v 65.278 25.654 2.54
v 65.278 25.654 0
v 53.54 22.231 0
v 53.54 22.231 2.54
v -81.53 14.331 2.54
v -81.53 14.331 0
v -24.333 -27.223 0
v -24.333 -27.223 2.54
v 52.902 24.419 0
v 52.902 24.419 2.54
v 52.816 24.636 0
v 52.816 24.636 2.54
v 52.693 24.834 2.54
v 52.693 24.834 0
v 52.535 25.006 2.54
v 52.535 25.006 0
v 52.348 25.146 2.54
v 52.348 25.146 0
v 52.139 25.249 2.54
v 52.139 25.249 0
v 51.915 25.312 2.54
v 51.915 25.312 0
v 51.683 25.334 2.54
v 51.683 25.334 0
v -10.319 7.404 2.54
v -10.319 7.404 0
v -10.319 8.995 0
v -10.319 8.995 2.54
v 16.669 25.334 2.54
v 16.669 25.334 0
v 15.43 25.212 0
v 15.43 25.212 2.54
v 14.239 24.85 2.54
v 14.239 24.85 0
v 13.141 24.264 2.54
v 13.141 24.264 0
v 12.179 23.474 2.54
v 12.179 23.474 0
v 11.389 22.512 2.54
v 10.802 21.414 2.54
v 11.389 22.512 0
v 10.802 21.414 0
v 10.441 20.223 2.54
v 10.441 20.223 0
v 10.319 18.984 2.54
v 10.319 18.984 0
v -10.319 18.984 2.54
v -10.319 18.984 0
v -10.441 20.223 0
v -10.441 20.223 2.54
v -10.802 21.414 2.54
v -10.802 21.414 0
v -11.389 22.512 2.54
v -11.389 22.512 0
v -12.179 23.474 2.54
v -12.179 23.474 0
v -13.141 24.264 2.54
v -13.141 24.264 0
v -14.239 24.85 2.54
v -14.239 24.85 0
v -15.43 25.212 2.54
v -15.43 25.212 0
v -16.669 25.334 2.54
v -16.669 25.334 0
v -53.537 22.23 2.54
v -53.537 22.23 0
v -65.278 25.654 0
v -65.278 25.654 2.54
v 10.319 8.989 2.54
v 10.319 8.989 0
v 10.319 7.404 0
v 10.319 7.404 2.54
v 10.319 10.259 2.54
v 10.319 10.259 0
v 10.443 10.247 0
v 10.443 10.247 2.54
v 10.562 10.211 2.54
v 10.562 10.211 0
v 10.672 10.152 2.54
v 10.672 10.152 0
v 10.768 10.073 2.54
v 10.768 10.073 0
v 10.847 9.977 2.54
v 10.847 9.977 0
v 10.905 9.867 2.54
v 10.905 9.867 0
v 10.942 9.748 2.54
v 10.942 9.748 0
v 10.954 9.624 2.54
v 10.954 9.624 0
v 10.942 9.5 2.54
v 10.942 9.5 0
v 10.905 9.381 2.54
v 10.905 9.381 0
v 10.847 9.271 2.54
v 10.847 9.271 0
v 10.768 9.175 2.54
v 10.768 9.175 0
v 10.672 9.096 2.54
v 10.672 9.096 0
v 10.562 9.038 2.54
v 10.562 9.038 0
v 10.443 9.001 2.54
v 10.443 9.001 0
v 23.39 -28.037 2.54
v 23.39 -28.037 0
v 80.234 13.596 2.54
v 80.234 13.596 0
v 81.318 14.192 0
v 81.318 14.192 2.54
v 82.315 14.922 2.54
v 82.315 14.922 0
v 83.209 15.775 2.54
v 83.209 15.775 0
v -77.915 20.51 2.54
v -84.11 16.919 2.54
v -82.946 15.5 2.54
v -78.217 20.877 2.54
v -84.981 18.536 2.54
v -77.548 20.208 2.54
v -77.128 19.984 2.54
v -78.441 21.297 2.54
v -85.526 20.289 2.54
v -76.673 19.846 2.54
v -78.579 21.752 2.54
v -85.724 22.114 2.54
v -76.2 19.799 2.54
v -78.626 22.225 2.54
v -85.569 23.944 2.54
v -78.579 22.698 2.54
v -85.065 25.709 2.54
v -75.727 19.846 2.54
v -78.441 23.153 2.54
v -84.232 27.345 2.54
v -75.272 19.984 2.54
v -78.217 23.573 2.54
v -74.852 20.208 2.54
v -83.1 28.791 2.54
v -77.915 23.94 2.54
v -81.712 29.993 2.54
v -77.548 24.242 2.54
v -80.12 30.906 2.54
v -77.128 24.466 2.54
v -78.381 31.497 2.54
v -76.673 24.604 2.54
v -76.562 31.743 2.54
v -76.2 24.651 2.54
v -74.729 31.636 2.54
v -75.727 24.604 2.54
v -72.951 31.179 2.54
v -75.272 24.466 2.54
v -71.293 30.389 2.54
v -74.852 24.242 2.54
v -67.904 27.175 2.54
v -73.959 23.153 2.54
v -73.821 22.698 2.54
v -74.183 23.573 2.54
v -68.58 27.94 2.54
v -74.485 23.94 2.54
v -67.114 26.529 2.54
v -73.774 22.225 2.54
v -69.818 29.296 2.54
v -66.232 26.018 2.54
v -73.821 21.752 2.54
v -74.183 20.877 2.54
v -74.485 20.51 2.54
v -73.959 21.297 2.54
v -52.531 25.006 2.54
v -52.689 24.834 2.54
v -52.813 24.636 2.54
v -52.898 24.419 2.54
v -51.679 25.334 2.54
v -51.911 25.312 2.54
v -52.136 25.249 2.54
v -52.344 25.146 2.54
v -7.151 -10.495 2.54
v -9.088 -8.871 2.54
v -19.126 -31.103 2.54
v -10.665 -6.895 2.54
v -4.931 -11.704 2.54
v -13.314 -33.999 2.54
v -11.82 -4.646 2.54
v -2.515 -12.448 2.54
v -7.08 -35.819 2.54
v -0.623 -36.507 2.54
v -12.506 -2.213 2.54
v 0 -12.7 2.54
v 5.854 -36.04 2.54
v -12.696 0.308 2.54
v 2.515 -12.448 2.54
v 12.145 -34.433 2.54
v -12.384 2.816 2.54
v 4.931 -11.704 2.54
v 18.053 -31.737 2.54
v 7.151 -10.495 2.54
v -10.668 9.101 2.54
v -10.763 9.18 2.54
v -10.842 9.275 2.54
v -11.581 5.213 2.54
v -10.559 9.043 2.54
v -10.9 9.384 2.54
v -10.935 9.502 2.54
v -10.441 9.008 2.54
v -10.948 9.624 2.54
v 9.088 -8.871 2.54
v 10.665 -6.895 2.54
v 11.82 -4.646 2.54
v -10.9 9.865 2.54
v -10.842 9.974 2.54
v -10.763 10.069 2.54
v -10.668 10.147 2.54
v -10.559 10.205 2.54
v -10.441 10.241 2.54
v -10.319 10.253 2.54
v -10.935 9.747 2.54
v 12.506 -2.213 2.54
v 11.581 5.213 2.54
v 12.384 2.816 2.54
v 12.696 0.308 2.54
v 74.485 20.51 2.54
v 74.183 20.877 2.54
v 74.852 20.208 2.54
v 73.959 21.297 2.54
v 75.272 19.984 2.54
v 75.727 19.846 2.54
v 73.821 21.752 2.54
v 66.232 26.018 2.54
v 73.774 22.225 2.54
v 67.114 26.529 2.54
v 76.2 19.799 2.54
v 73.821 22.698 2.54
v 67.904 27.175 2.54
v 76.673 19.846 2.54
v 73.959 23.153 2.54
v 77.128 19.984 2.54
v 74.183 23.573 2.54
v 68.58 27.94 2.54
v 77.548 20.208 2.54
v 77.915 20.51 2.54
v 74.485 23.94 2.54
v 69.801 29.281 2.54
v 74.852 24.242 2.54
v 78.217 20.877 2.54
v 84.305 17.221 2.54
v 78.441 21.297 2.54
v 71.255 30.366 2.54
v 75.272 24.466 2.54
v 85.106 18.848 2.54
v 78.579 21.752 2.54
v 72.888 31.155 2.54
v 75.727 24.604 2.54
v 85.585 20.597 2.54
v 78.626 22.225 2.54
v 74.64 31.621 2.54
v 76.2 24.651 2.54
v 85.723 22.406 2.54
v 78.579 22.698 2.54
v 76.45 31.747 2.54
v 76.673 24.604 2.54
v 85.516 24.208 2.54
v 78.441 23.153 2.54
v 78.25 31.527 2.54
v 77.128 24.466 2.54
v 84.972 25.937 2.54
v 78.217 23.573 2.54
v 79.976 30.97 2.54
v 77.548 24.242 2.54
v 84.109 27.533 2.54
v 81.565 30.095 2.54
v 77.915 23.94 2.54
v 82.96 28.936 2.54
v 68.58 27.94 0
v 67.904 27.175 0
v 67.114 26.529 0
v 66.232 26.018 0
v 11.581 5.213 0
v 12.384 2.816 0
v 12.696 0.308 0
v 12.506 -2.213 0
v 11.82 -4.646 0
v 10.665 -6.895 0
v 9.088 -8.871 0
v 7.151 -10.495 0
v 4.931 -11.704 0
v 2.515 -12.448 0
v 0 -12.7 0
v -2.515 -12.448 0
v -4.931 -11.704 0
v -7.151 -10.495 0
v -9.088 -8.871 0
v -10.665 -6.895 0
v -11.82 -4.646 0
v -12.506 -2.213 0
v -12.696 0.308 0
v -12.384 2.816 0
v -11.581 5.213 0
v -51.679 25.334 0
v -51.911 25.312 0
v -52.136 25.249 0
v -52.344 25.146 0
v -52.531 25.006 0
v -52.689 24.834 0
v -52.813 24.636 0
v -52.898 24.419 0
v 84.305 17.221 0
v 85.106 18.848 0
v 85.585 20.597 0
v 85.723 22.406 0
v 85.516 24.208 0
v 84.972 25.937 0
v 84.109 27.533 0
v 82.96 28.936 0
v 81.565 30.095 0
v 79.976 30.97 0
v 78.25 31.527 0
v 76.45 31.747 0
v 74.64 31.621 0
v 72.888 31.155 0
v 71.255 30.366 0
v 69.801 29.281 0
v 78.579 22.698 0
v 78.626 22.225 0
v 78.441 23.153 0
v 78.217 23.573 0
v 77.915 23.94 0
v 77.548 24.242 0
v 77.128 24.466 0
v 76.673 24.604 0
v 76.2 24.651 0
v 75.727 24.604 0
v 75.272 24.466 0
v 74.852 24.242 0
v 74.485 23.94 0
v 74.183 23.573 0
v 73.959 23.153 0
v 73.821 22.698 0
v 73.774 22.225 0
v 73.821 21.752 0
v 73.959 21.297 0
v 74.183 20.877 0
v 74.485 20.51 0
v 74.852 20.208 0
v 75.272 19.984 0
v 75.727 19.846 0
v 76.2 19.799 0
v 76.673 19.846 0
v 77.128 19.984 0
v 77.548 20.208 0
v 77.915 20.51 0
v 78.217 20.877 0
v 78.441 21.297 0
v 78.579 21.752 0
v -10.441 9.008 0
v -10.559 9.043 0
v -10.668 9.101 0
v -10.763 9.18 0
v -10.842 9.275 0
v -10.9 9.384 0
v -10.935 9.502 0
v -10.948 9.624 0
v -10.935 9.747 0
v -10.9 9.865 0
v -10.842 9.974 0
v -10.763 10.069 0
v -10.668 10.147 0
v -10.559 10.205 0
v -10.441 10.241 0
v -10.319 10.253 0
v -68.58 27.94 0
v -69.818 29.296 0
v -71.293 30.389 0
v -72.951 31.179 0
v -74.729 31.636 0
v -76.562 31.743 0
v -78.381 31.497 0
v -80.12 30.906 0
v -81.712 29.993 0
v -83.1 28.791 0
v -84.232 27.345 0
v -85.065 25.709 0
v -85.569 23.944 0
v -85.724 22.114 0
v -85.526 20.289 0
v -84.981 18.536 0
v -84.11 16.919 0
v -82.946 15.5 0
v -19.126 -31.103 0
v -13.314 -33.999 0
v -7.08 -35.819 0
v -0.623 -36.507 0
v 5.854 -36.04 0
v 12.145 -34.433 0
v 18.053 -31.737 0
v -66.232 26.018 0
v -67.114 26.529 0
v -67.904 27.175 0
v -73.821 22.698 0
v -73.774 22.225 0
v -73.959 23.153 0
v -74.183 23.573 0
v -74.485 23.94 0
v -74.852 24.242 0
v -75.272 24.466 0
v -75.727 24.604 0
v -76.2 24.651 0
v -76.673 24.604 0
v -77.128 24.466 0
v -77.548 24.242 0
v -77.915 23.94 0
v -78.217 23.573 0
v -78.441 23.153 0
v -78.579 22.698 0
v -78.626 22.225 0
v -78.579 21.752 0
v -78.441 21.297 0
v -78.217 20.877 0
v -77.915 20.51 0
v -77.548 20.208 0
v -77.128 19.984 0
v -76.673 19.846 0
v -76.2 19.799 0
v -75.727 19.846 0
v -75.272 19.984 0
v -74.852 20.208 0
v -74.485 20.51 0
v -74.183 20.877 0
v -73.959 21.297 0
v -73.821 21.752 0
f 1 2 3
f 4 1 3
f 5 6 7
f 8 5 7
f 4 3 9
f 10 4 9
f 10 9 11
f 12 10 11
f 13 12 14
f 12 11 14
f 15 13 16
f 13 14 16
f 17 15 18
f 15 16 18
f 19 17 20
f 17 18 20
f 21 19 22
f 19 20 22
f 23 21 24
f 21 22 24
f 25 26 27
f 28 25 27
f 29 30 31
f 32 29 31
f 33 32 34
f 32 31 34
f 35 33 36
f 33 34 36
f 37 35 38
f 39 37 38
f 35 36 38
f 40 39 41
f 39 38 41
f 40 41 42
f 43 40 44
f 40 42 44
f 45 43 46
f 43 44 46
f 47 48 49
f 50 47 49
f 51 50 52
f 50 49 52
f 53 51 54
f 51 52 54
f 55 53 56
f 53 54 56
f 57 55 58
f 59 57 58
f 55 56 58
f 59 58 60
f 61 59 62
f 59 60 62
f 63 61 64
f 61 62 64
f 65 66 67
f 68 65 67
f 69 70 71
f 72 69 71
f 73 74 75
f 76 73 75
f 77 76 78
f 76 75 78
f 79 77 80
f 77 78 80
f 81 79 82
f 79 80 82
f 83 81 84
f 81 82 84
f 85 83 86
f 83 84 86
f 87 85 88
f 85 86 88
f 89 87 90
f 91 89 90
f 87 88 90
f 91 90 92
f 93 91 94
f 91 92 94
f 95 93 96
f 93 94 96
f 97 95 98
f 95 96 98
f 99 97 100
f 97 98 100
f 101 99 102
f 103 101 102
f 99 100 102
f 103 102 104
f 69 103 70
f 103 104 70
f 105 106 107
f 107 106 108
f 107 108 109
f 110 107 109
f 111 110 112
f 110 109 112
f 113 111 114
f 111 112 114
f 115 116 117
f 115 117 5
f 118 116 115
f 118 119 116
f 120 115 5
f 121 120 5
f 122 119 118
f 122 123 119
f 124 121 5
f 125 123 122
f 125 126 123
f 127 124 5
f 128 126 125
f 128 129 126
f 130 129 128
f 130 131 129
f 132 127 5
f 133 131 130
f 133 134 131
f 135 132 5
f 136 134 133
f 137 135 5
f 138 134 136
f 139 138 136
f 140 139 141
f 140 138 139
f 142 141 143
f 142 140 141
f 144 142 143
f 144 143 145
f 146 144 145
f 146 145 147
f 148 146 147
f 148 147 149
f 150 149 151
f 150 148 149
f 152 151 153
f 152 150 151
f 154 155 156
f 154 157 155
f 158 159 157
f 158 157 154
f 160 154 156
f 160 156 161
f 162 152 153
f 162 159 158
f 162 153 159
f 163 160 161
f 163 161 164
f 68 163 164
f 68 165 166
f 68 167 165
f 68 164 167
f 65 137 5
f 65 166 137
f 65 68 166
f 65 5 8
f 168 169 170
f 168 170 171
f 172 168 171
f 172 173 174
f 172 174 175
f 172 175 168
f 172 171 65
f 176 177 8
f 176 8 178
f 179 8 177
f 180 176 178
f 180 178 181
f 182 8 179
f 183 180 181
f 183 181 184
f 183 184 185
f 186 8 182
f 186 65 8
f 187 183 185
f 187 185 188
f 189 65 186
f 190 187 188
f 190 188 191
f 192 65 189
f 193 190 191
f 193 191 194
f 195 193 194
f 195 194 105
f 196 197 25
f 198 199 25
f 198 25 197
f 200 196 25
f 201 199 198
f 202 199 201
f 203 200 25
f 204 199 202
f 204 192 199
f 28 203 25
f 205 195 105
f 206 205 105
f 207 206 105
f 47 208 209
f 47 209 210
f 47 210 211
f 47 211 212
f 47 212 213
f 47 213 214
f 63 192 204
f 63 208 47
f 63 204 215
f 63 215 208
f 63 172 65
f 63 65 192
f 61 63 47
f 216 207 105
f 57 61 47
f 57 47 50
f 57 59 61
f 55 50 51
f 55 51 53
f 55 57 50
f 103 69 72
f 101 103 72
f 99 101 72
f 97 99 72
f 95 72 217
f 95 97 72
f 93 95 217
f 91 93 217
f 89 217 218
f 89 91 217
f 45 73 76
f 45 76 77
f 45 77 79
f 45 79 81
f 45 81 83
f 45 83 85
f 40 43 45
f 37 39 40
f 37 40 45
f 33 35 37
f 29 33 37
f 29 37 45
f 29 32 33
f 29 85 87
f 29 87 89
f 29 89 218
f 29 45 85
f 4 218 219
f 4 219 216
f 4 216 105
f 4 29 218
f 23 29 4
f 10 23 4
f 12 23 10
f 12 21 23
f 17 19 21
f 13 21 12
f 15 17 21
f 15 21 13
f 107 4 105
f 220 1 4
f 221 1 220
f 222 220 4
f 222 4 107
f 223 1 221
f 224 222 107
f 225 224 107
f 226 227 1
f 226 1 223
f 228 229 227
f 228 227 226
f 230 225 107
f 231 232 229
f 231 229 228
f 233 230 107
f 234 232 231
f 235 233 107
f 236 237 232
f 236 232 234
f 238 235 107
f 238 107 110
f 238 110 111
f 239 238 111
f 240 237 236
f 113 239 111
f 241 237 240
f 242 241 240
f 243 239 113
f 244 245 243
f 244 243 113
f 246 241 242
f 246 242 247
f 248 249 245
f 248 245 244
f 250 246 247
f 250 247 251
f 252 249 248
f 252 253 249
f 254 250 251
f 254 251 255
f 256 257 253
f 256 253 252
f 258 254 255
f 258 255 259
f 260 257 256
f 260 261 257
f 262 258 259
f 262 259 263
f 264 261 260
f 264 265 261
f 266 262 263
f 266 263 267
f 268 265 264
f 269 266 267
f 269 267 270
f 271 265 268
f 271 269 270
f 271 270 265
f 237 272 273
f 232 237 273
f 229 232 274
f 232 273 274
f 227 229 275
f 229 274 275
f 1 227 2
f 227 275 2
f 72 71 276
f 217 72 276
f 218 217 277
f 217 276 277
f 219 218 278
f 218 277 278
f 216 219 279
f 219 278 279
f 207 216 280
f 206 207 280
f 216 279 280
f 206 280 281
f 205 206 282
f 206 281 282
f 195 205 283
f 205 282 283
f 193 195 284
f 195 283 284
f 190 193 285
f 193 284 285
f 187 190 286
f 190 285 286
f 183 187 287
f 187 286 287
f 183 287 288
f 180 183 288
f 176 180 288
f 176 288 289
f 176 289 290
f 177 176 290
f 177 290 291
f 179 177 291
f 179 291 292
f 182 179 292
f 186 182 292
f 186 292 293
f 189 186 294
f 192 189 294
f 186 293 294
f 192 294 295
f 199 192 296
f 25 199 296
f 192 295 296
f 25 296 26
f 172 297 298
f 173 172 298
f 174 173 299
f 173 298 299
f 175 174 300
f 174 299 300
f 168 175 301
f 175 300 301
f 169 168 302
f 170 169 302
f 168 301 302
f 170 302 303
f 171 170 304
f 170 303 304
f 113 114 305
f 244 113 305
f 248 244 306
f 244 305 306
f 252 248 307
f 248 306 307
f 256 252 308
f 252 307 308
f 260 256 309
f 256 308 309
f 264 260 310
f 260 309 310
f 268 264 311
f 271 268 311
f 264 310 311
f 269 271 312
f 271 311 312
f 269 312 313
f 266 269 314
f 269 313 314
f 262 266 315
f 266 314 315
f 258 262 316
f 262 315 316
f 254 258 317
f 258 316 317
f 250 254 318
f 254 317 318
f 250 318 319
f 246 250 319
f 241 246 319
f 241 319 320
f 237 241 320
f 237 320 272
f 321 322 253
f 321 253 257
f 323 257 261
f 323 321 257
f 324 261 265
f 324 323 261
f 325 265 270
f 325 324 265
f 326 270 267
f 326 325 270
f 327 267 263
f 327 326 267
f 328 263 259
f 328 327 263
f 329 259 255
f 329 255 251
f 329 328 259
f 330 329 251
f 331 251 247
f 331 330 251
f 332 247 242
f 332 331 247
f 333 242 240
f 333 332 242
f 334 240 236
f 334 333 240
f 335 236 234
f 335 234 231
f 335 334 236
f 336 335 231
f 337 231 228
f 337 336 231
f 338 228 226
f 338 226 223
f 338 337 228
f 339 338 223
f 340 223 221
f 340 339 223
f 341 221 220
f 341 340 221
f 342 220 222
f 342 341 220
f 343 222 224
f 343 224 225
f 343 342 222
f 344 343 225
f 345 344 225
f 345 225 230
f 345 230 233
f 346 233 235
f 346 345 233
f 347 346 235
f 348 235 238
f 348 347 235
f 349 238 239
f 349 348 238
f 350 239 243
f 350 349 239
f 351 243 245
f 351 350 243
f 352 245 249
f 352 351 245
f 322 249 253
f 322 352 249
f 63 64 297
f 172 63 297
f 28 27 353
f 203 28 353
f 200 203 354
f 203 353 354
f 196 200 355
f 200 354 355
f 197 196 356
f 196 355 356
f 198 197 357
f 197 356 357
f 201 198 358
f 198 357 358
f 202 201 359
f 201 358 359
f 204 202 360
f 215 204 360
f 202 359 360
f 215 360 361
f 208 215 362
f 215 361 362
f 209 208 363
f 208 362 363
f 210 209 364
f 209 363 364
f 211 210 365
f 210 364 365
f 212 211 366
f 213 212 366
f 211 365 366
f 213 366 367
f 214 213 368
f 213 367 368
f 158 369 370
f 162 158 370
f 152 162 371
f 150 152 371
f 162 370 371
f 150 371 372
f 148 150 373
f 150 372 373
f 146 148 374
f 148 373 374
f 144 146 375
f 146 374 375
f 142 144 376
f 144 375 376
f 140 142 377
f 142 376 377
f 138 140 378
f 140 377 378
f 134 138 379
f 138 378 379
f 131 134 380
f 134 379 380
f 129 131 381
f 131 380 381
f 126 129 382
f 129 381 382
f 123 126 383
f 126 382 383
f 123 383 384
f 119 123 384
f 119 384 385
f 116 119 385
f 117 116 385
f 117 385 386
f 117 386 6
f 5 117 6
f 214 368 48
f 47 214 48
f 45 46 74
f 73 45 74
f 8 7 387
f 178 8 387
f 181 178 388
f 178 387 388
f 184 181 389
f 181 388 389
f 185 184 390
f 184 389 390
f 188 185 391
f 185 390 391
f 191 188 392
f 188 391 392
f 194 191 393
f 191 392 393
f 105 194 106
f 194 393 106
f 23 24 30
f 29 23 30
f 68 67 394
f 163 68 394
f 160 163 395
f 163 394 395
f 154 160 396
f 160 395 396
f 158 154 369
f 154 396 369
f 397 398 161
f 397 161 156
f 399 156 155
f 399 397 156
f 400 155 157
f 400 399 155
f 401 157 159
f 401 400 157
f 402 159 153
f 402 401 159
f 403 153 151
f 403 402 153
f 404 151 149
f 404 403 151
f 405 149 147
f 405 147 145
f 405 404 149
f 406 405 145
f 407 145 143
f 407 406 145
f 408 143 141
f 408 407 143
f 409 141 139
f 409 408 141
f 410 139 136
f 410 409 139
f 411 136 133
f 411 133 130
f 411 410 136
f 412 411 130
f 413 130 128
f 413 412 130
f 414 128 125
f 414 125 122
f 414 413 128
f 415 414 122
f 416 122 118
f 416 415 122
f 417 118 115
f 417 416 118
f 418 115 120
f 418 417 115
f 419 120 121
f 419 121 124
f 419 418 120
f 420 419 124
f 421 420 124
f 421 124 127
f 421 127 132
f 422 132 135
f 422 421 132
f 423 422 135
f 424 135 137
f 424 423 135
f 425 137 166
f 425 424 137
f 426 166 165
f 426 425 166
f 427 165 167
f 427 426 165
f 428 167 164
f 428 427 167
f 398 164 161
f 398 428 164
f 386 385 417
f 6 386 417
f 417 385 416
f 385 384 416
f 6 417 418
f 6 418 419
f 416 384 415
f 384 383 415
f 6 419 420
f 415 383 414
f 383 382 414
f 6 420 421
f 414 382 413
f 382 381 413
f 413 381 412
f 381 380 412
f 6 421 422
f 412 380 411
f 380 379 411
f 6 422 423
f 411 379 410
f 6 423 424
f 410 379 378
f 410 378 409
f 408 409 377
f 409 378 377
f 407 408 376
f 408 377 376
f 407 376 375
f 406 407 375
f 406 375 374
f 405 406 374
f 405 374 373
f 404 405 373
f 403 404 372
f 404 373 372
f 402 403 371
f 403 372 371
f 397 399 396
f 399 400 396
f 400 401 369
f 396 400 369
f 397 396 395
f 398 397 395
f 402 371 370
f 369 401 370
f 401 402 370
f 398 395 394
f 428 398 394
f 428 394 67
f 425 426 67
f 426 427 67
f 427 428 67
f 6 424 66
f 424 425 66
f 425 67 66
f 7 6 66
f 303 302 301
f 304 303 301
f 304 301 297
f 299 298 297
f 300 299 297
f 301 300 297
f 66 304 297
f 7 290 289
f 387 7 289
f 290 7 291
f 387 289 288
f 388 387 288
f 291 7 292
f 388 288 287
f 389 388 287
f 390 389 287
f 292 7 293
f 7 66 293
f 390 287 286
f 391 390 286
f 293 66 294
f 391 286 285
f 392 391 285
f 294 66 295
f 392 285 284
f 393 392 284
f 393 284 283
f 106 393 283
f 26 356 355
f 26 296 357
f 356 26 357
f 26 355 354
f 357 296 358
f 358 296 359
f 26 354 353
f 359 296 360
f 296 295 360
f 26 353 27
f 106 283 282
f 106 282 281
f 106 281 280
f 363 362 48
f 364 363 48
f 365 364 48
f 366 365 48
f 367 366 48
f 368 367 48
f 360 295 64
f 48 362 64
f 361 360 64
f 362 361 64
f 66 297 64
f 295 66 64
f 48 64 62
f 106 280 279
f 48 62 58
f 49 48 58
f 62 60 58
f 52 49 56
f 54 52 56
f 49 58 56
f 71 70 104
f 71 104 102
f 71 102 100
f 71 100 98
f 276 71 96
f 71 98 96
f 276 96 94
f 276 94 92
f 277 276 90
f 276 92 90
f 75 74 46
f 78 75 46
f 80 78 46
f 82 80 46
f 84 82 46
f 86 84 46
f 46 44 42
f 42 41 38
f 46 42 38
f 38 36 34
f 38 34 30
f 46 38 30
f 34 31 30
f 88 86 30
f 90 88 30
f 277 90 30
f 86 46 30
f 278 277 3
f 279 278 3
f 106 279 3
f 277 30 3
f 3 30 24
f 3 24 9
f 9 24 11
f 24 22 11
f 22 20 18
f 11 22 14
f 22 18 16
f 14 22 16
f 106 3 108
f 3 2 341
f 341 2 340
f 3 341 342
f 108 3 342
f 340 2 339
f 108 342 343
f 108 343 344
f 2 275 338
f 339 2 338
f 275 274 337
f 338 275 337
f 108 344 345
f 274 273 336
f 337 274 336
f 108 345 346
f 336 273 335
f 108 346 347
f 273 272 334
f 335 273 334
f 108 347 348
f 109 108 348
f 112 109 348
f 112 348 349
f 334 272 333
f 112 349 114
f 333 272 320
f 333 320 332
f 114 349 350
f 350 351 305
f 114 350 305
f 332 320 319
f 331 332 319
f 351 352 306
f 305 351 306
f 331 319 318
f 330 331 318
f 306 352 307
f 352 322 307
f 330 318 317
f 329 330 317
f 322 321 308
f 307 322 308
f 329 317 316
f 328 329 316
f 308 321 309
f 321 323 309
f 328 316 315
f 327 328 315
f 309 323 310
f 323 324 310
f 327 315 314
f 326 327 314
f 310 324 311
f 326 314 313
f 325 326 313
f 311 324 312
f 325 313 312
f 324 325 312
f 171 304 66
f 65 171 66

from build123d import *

# Parameters (mm, degrees)
F0_R     = 2.4257
F1_DEPTH = 2.54


with BuildPart() as f1:
    # F0 (on Top) → F1 (new body)
    with BuildSketch(Plane.XY):
        with BuildLine():
            ThreePointArc((10.31875, 7.403607), (0, -12.7), (-10.31875, 7.403607))
            Line((-10.31875, 7.403607), (-10.31875, 8.995426))
            ThreePointArc((-10.31875, 8.995426), (-10.947542, 9.624218), (-10.31875, 10.25301))
            Line((-10.31875, 10.25301), (-10.31875, 18.983854))
            ThreePointArc((-10.31875, 18.983854), (-12.178622, 23.473982), (-16.66875, 25.333854))
            Line((-16.66875, 25.333854), (-51.678968, 25.333854))
            ThreePointArc((-51.678968, 25.333854), (-52.440968, 25.079854), (-52.898168, 24.419454))
            Line((-52.898168, 24.419454), (-53.536901, 22.229512))
            Line((-53.536901, 22.229512), (-65.277999, 25.653999))
            ThreePointArc((-65.277999, 25.653999), (-67.114483, 26.529079), (-68.58, 27.94))
            ThreePointArc((-68.58, 27.94), (-83.100222, 28.791015), (-81.529968, 14.330884))
            Line((-81.529968, 14.330884), (-24.332909, -27.222641))
            ThreePointArc((-24.332909, -27.222641), (-0.623226, -36.507181), (23.389548, -28.037327))
            Line((23.389548, -28.037327), (80.234168, 13.596494))
            Line((80.234168, 13.596494), (83.209212, 15.775459))
            ThreePointArc((83.209212, 15.775459), (82.289932, 29.548821), (68.58, 27.94))
            ThreePointArc((68.58, 27.94), (67.114483, 26.529079), (65.277999, 25.653999))
            Line((65.277999, 25.653999), (53.540294, 22.230502))
            Line((53.540294, 22.230502), (52.90185, 24.419454))
            ThreePointArc((52.90185, 24.419454), (52.44465, 25.079854), (51.68265, 25.333854))
            Line((51.68265, 25.333854), (16.66875, 25.333854))
            ThreePointArc((16.66875, 25.333854), (12.178622, 23.473982), (10.31875, 18.983854))
            Line((10.31875, 18.983854), (10.31875, 10.259218))
            ThreePointArc((10.31875, 10.259218), (10.95375, 9.624218), (10.31875, 8.989218))
            Line((10.31875, 8.989218), (10.31875, 7.403607))
        make_face()
        with Locations((-76.2, 22.225)):
            Circle(F0_R, mode=Mode.SUBTRACT)
        with Locations((76.2, 22.225)):
            Circle(F0_R, mode=Mode.SUBTRACT)
        with BuildLine():
            ThreePointArc((80.234168, 13.596494), (81.828146, 14.540627), (83.209212, 15.775459))
            Line((83.209212, 15.775459), (80.234168, 13.596494))
        make_face()
    extrude(amount=F1_DEPTH)


solid = f1.part
